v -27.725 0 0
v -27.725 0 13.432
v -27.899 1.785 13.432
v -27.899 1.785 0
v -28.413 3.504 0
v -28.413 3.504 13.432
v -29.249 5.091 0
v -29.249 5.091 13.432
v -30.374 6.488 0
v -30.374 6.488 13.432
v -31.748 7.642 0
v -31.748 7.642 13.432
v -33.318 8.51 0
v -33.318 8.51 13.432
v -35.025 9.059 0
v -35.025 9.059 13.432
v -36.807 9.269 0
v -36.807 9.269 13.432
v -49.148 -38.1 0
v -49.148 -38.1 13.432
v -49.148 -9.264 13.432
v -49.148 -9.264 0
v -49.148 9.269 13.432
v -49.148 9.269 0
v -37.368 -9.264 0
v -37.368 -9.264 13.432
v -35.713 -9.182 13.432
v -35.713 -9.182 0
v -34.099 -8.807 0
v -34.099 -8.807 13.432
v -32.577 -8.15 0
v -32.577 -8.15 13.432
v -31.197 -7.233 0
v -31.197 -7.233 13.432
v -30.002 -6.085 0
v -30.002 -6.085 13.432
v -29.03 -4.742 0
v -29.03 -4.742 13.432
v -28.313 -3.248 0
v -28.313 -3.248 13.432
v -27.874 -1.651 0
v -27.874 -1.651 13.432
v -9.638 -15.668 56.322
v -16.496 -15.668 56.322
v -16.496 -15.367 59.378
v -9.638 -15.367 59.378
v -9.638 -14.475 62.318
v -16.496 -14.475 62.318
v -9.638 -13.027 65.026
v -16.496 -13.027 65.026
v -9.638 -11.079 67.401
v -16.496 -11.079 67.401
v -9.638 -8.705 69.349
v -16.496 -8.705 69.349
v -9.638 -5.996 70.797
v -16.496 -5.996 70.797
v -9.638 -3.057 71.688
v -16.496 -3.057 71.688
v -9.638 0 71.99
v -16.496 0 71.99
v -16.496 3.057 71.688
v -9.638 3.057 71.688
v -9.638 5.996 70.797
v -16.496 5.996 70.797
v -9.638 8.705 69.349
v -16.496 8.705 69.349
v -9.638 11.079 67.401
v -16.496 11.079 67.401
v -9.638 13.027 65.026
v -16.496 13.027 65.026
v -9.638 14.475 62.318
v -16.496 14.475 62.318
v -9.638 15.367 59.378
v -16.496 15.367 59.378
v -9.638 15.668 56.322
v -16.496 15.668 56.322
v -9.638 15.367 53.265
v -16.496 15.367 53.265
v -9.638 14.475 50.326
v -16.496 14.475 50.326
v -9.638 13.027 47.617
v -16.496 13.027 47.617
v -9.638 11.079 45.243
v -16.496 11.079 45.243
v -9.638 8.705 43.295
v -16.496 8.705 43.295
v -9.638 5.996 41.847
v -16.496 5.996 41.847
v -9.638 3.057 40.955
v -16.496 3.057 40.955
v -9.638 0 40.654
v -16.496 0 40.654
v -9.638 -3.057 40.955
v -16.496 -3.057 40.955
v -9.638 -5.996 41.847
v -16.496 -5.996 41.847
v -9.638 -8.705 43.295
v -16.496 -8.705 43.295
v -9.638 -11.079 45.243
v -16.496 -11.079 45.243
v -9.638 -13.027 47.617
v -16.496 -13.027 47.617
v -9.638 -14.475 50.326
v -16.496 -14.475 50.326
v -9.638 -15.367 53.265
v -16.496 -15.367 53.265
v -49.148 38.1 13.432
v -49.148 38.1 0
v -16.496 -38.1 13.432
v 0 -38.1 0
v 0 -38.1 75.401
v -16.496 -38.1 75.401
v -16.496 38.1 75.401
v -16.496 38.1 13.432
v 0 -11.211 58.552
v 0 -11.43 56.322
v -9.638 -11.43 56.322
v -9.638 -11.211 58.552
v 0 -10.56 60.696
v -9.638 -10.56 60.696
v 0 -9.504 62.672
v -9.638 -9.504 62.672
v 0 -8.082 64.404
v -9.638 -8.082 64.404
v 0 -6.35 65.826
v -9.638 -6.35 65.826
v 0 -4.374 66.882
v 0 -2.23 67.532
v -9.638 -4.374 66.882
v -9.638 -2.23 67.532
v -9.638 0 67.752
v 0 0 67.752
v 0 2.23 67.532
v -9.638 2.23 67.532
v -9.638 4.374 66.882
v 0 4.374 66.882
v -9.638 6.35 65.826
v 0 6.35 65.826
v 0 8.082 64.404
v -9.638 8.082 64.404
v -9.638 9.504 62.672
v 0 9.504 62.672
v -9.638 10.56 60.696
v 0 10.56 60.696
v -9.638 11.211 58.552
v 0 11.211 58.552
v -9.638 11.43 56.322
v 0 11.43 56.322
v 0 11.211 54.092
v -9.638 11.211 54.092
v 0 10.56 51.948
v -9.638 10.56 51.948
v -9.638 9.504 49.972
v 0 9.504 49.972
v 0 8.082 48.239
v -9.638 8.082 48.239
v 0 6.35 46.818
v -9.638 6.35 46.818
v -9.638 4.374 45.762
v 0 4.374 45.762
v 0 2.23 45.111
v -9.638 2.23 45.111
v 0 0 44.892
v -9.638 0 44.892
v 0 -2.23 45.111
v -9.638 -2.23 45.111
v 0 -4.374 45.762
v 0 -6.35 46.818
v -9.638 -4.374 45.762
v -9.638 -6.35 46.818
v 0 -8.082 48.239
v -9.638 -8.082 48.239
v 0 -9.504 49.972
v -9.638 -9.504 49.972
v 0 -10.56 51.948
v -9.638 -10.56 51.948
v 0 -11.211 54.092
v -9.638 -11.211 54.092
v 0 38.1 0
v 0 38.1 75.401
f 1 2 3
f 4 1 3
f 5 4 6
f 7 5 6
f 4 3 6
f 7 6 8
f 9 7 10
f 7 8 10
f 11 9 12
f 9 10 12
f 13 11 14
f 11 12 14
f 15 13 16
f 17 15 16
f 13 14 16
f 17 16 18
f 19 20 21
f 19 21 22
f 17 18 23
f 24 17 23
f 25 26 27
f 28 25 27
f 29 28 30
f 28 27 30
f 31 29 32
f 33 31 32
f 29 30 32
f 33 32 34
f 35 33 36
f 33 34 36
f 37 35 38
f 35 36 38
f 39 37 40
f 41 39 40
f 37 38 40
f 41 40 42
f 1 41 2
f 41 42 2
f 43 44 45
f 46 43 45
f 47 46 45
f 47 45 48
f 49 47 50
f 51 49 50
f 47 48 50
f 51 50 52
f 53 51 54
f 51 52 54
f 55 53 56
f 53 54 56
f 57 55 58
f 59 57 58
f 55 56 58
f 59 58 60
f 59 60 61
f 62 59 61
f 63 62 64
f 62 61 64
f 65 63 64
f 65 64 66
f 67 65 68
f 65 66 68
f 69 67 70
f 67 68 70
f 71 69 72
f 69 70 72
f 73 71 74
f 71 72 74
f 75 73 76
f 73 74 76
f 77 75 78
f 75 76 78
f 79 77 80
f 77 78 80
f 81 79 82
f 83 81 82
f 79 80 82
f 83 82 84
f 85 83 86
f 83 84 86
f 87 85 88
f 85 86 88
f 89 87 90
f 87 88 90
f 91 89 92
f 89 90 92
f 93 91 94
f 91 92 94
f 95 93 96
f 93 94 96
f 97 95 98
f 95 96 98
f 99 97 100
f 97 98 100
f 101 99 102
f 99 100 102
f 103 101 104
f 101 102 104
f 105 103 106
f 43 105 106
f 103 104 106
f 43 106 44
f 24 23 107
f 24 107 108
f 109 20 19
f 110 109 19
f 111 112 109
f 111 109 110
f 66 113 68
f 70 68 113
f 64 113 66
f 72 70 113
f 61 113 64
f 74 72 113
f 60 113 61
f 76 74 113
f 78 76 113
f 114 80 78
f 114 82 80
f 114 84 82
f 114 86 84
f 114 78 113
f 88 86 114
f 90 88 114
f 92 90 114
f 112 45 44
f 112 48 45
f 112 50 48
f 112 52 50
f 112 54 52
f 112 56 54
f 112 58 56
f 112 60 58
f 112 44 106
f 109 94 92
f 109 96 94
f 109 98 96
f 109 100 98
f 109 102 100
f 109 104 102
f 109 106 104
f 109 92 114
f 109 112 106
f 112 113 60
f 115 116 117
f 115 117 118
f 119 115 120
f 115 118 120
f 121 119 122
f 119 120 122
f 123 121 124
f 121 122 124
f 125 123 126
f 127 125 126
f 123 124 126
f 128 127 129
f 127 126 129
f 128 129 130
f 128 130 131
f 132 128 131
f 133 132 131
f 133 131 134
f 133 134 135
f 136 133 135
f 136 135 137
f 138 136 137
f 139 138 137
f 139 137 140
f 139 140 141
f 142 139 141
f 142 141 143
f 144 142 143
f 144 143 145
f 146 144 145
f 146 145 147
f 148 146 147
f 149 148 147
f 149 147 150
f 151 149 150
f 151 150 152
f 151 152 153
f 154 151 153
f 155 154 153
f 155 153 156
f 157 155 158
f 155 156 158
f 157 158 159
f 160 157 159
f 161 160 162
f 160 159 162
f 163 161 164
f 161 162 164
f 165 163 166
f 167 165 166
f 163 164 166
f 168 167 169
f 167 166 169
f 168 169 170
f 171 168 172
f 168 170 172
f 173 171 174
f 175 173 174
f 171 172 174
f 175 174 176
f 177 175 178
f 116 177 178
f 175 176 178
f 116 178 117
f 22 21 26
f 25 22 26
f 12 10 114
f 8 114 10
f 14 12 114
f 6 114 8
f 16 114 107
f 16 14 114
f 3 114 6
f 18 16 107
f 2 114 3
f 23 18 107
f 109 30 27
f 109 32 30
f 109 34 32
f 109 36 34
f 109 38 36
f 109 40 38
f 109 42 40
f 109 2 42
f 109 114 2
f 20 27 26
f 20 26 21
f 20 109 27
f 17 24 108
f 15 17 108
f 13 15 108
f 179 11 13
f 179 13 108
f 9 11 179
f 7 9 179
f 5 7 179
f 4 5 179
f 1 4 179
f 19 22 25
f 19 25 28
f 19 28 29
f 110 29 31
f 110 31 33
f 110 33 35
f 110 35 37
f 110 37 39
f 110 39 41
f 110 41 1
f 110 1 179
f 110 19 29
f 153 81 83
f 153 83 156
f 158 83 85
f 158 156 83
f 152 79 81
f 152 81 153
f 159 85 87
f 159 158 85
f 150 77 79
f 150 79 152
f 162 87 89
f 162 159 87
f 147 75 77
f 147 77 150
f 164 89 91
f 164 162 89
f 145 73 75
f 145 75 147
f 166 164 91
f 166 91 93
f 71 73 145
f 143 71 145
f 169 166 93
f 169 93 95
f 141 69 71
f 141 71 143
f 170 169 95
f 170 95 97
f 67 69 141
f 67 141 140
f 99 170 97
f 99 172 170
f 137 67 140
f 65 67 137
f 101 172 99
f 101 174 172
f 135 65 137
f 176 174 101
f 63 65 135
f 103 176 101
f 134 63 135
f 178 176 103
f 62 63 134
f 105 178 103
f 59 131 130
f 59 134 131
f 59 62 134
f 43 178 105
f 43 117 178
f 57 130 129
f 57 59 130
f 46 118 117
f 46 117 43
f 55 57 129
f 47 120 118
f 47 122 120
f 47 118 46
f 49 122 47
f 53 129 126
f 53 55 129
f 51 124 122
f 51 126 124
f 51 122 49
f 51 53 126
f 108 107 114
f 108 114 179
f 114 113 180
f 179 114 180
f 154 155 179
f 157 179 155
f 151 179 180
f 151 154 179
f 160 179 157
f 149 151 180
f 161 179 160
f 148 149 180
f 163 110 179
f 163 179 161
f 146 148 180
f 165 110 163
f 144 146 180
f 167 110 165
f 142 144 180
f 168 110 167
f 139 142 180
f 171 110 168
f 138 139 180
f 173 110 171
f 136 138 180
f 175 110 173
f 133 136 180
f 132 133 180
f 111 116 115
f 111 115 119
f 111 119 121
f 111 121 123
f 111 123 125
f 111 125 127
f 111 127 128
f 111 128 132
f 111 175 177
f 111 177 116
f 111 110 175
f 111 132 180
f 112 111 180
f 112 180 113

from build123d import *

# Parameters (mm, degrees)
F1_DEPTH = 38.1
F2_R     = 11.430216
F3_DEPTH = 16.495738
F4_R     = 15.667724
F4_R_2   = 11.430216
F5_DEPTH = 6.858
F7_DEPTH = 13.431763


with BuildPart() as f1:
    # F0 (on Front) → F1 (new body, symmetric)
    with BuildSketch(Plane.XZ):
        Polygon((-49.148042, 0), (0, 0), (0, 75.40103), (-16.495738, 75.40103), (-16.495738, 13.431763), (-49.148042, 13.431763), align=None)
    extrude(amount=F1_DEPTH, both=True)

    # F2 (on face) → F3 (cut, through all)
    with BuildSketch(Plane(origin=(-16.495738, 0, 0), x_dir=(0, -1, 0), z_dir=(-1, 0, 0))):
        with Locations((0, 56.321822)):
            Circle(F2_R)
    extrude(amount=-F3_DEPTH, mode=Mode.SUBTRACT)

    # F4 (on face) → F5 (cut)
    with BuildSketch(Plane(origin=(-16.495738, 0, 0), x_dir=(0, -1, 0), z_dir=(-1, 0, 0))):
        with Locations((0, 56.321822)):
            Circle(F4_R)
        with Locations((0, 56.321822)):
            Circle(F4_R_2, mode=Mode.SUBTRACT)
    extrude(amount=-F5_DEPTH, mode=Mode.SUBTRACT)

    # F6 (on face) → F7 (cut, through all)
    with BuildSketch(Plane.XY.offset(13.431763)):
        with BuildLine():
            ThreePointArc((-37.367893, -9.263817), (-30.573506, -6.685717), (-27.725438, 0))
            ThreePointArc((-27.725438, 0), (-30.374154, 6.488307), (-36.806871, 9.269308))
            Line((-36.806871, 9.269308), (-37.186506, 9.269308))
            ThreePointArc((-37.186506, 9.269308), (-46.267496, 0.090735), (-37.367893, -9.263817))
        make_face()
        with BuildLine():
            Line((-49.148042, -9.263817), (-37.367893, -9.263817))
            ThreePointArc((-37.367893, -9.263817), (-46.267496, 0.090735), (-37.186506, 9.269308))
            Line((-37.186506, 9.269308), (-49.148042, 9.269308))
            Line((-49.148042, 9.269308), (-49.148042, -9.263817))
        make_face()
    extrude(amount=-F7_DEPTH, mode=Mode.SUBTRACT)


solid = f1.part
